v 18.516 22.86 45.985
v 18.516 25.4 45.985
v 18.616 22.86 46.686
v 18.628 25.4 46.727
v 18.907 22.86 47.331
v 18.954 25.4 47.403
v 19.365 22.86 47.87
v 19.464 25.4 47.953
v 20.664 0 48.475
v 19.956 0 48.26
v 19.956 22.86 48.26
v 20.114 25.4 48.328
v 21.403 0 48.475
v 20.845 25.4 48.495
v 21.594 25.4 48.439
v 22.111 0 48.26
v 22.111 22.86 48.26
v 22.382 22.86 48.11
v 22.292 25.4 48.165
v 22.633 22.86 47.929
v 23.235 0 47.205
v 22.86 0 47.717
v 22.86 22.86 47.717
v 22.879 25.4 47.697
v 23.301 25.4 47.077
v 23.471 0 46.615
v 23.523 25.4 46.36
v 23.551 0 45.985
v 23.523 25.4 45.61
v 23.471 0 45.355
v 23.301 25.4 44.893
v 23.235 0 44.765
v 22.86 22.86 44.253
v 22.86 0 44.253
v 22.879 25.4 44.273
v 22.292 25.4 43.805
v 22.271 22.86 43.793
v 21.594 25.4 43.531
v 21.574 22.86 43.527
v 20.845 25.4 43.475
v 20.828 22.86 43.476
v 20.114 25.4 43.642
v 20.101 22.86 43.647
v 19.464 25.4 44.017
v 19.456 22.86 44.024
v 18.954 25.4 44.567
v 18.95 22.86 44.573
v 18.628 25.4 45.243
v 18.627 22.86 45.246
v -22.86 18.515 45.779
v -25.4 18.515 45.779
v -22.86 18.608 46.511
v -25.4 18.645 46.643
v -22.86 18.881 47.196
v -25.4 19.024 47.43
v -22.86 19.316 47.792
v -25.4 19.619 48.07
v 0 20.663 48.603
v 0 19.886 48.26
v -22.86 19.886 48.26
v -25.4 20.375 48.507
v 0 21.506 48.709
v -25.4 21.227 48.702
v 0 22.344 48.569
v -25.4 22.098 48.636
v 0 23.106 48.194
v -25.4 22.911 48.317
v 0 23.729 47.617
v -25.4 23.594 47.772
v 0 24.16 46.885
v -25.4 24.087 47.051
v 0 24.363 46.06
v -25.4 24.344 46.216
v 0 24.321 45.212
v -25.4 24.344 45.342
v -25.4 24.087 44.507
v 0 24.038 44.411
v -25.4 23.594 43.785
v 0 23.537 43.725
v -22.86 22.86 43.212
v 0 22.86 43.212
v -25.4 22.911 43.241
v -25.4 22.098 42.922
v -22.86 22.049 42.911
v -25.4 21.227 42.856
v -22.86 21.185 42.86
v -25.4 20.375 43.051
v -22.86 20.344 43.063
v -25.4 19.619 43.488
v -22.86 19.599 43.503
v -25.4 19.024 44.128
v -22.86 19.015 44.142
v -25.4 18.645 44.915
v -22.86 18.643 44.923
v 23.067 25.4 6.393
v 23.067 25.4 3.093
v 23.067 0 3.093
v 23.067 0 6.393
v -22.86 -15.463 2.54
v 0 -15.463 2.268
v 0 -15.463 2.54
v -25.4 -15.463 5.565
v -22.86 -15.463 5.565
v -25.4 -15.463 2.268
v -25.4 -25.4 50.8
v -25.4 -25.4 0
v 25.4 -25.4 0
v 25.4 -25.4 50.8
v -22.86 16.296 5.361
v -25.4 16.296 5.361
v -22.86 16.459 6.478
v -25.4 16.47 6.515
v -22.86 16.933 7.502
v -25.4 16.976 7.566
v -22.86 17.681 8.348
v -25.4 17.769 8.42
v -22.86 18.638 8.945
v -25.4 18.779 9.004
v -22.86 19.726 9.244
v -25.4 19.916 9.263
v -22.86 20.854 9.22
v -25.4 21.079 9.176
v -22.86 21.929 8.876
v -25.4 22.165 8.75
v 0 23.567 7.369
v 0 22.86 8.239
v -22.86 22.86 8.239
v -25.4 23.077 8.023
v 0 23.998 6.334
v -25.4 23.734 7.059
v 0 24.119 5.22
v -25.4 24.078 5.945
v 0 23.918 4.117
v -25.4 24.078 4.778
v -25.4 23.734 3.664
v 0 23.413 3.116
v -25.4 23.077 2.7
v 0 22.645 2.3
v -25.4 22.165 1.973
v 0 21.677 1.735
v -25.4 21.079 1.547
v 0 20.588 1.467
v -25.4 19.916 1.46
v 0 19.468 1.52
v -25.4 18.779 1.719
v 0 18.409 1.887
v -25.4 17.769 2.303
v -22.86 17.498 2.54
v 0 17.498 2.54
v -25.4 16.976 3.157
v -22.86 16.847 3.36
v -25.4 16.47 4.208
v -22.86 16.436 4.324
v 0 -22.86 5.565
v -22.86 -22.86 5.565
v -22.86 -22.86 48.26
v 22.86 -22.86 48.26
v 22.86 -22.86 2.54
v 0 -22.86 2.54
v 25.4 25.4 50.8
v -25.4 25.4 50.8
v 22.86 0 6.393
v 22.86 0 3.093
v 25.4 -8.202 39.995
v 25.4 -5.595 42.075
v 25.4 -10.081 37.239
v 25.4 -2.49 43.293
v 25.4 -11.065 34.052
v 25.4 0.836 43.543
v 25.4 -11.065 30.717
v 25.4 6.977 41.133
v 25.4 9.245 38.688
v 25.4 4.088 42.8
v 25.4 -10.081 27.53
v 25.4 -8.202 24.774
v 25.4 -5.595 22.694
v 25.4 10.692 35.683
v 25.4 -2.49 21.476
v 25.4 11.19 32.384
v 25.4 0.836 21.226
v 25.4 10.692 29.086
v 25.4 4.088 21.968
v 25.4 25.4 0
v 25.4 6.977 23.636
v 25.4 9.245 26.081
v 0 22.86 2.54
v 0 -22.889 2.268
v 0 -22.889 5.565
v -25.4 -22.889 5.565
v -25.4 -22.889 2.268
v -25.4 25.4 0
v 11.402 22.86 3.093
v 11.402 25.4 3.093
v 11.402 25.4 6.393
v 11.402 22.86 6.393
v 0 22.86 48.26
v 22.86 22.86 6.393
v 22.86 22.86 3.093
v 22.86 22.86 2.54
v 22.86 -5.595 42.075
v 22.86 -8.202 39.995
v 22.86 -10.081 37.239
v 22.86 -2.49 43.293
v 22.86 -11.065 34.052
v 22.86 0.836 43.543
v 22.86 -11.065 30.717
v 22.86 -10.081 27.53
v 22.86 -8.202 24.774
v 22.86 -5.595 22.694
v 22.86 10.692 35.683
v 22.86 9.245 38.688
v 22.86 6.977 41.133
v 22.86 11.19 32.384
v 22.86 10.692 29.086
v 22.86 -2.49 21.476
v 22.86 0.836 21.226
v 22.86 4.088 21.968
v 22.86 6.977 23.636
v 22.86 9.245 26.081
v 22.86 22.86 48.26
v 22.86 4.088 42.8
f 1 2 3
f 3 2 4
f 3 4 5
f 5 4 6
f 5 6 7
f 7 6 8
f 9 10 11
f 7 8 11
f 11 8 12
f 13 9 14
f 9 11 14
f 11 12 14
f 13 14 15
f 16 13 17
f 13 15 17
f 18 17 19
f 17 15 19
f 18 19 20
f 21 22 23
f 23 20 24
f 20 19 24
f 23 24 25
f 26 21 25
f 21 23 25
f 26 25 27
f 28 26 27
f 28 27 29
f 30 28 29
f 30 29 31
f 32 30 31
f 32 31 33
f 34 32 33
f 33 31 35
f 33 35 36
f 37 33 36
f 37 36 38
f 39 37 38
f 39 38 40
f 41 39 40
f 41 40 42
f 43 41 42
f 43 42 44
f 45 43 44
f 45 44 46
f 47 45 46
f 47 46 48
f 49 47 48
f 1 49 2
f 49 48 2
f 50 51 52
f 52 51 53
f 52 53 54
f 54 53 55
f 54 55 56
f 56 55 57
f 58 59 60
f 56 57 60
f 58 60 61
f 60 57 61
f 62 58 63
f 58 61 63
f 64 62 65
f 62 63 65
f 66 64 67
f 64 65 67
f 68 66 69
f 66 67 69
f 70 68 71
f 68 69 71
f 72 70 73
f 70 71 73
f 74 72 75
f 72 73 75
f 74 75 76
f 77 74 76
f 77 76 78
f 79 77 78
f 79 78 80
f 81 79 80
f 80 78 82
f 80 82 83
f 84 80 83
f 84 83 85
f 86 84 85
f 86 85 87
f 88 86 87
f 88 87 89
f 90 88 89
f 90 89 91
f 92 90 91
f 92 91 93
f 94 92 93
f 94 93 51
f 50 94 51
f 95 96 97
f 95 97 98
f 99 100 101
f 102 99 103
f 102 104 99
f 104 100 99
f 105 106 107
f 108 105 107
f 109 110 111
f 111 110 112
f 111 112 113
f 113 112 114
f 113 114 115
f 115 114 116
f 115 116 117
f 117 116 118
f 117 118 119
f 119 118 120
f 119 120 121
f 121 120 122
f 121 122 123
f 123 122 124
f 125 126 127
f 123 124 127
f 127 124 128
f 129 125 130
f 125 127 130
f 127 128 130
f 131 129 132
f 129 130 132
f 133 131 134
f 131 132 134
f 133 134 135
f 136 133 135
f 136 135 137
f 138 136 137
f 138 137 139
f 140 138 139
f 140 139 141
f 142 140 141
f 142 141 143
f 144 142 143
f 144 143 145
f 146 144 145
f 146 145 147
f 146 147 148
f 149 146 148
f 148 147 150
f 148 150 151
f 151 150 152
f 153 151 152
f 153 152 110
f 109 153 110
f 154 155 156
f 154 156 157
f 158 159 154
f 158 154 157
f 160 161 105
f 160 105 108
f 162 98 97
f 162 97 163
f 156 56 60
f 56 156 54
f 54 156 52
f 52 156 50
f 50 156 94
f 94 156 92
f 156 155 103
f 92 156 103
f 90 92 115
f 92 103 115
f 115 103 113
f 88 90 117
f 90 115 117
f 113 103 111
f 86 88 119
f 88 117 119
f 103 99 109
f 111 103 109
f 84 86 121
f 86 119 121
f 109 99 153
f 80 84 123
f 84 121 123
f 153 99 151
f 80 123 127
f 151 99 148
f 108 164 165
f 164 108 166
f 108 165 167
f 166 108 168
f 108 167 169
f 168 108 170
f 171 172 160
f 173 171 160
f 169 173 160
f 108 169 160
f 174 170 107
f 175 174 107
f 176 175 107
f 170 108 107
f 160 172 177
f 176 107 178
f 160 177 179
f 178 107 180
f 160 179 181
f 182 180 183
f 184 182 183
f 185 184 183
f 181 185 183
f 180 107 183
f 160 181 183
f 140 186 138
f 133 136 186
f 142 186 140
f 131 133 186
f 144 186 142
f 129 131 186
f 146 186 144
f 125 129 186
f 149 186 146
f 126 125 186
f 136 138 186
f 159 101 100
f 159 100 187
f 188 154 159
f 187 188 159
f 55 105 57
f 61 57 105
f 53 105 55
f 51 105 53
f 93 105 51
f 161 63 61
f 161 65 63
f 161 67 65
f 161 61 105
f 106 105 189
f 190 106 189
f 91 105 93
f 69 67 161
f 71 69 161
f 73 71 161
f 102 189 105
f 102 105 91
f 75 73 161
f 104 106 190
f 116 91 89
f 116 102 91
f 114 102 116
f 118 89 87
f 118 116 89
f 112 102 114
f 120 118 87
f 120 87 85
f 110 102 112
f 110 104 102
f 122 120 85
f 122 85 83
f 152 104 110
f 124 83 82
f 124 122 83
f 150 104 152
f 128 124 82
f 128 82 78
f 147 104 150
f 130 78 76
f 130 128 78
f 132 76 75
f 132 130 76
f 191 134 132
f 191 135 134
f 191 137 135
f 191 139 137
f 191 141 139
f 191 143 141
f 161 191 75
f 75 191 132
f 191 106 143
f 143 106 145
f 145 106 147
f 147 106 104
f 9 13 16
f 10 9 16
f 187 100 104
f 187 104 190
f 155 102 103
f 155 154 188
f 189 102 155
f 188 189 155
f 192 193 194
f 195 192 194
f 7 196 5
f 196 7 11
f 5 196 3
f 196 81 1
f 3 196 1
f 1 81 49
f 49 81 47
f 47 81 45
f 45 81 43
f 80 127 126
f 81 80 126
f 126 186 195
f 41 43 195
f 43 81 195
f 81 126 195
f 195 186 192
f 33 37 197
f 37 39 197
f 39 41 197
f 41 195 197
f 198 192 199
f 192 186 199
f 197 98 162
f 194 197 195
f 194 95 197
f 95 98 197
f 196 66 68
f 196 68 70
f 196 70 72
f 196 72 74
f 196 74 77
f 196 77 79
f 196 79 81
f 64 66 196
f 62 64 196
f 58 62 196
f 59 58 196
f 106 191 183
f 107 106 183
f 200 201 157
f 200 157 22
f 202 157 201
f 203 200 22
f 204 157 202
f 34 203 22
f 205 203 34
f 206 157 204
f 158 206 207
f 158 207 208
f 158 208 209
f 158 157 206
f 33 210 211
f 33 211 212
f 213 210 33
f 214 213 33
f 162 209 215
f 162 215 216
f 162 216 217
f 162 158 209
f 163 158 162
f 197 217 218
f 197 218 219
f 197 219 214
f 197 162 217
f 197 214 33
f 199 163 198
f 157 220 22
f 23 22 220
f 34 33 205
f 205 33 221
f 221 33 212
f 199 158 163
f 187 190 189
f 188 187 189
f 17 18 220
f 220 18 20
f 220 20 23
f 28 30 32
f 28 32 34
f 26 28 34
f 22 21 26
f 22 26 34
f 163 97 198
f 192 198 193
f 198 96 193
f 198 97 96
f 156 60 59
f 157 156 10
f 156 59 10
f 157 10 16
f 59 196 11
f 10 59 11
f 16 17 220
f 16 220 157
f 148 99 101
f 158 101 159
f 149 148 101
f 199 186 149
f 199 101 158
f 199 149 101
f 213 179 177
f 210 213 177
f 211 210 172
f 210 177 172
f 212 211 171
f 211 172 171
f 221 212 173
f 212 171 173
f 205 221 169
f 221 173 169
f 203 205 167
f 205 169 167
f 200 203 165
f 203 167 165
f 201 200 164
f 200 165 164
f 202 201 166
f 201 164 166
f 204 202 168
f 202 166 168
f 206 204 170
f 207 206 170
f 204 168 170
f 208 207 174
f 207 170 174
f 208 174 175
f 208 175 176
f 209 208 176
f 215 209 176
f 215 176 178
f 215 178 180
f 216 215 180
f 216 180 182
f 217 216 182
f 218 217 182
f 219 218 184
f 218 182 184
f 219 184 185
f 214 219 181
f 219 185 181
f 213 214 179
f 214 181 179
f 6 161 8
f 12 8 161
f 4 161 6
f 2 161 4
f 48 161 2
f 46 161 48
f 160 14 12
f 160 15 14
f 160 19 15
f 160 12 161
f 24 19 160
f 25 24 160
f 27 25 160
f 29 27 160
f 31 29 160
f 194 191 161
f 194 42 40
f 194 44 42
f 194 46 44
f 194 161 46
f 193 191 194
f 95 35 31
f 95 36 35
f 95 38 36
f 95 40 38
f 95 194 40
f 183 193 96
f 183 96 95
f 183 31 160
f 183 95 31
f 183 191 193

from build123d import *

# Parameters (mm, degrees)
F0_W      = 50.8
F0_H      = 50.8
F1_DEPTH  = 50.8
F3_T      = -2.54
F2_R      = 11.1895018243
F4_DEPTH  = 2.54
F5_W      = 11.6650760174
F5_H      = 3.2993815839
F6_DEPTH  = 25.4
F7_R      = 2.5171305481
F8_DEPTH  = 25.4
F9_R      = 2.9308146248
F9_R_2    = 3.9125837807
F9_W      = 7.4259676039
F9_H      = 3.2972879708
F10_DEPTH = 25.4


with BuildPart() as f1:
    # F0 (on Top) → F1 (new body)
    with BuildSketch(Plane.XY):
        Rectangle(F0_W, F0_H)
    extrude(amount=F1_DEPTH)

    # F3 (hollow: no face is removed)
    offset(amount=F3_T, mode=Mode.SUBTRACT)

    # F2 (on face) → F4 (cut, through all)
    with BuildSketch(Plane.YZ.offset(25.4)):
        with Locations((0, 32.3844626546)):
            Circle(F2_R)
    extrude(amount=-F4_DEPTH, mode=Mode.SUBTRACT)

    # F5 (on face) → F6 (cut)
    with BuildSketch(Plane(origin=(0, 25.4, 0), x_dir=(-1, 0, 0), z_dir=(0, 1, 0))):
        with Locations((-17.2344464809, 4.7428607941)):
            Rectangle(F5_W, F5_H)
    extrude(amount=-F6_DEPTH, mode=Mode.SUBTRACT)

    # F7 (on face) → F8 (cut)
    with BuildSketch(Plane(origin=(0, 25.4, 0), x_dir=(-1, 0, 0), z_dir=(0, 1, 0))):
        with Locations((-21.0335571319, 45.9851287305)):
            Circle(F7_R)
    extrude(amount=-F8_DEPTH, mode=Mode.SUBTRACT)

    # F9 (on face) → F10 (cut)
    with BuildSketch(Plane(origin=(-25.4, 0, 0), x_dir=(0, -1, 0), z_dir=(-1, 0, 0))):
        with Locations((-21.4459802955, 45.7789190114)):
            Circle(F9_R)
        with Locations((-20.2087108046, 5.3614946082)):
            Circle(F9_R_2)
        with Locations((19.1762130708, 3.9165434428)):
            Rectangle(F9_W, F9_H)
    extrude(amount=-F10_DEPTH, mode=Mode.SUBTRACT)


solid = f1.part
